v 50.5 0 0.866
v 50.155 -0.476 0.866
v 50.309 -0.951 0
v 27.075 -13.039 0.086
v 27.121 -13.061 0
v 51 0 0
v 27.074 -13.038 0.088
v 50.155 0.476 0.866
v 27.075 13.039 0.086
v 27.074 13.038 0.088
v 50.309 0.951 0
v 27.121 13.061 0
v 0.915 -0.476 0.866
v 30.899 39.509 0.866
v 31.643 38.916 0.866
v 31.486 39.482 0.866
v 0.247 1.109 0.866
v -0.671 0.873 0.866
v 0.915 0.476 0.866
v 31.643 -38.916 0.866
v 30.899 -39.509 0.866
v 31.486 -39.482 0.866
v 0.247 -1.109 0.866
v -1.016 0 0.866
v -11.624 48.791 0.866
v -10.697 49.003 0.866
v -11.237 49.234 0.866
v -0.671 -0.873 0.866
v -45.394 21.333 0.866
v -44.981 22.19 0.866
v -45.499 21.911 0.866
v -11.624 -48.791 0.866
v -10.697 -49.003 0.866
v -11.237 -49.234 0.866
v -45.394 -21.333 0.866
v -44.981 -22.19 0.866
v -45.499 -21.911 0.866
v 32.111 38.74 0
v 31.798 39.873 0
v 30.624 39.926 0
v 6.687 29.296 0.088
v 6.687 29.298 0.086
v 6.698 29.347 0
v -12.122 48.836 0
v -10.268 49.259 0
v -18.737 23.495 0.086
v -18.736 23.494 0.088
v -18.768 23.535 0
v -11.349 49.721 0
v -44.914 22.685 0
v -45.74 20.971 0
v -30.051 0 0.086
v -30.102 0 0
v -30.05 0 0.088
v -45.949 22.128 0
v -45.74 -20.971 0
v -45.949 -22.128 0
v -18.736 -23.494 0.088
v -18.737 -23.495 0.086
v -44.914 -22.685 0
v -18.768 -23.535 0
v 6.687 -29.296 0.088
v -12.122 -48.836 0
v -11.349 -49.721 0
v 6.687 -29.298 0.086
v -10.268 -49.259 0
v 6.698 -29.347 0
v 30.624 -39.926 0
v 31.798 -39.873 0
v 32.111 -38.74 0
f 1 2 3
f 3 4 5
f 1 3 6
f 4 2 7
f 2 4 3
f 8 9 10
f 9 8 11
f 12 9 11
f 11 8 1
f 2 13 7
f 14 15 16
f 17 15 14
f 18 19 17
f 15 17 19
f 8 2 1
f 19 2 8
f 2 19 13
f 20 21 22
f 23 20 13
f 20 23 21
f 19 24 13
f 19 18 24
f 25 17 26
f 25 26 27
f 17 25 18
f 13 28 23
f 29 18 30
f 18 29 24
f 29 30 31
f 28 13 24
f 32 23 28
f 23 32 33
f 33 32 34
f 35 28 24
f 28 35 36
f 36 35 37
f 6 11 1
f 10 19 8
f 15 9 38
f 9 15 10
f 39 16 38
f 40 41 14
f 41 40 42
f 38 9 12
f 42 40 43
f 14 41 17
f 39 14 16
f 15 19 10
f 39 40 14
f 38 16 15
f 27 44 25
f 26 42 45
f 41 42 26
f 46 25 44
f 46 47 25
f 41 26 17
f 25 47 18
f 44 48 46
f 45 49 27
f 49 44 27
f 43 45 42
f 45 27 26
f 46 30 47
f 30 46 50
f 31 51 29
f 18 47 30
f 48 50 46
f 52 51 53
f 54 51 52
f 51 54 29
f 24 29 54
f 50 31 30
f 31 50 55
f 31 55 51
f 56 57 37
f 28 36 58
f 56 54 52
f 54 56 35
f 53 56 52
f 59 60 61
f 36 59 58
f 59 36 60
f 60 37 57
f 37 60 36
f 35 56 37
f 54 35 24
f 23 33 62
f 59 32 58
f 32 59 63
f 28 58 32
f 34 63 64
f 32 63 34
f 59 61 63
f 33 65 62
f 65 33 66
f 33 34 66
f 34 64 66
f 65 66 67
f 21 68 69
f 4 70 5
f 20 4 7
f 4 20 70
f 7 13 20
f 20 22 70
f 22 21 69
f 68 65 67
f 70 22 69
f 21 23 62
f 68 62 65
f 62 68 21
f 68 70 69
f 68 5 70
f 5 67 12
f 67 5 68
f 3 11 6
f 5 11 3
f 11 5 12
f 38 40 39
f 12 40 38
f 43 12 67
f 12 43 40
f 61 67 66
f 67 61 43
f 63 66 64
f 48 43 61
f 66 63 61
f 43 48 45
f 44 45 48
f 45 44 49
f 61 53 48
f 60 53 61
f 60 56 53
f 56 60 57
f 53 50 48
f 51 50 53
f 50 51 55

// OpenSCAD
/*[ Star  variables ]*/
//  number of points
NumberOfPoints =7; // [3:100]

//  length of points
LengthOfPoints =20; // [1:100]

//  outside diameter of star
TotalDiameterOfStar =50; // [10:200]

//  outside point roundness / height
OutsidePointRoundnessHeight =1; // [.1:50]

//  middle point roudness / height
MiddlepointRoudness =.1; // [.1:100]

//  center point height
centerpointHeight =1; // [.1:100]

// Do you want the bottom cut flat?
flatBottom="flat"; // ["flat","round"]

if(flatBottom == "flat"){
    difference(){
        star3d(NumberOfPoints
            ,LengthOfPoints
            ,TotalDiameterOfStar
            ,OutsidePointRoundnessHeight
            ,MiddlepointRoudness
            ,centerpointHeight);
        translate([0,0,-50])cube([TotalDiameterOfStar*3,TotalDiameterOfStar*3,100],true);
}
}else{
    star3d(NumberOfPoints
    ,LengthOfPoints
    ,TotalDiameterOfStar
    ,OutsidePointRoundnessHeight
    ,MiddlepointRoudness
    ,centerpointHeight);
}

module star3d(points, pointLEngth,totaldiameter, pointroundness = 1,MiddlepointRoudness = .1,centerPointHeight = 1){
    innerpointPosition = (360/points)/2;
    for(i=[0:points]){
        outerpointPosistion = (i*360)/points;
       hull(){
    rotate([0,0,outerpointPosistion])
            translate([totaldiameter,0,0])
                sphere(pointroundness,true);
    rotate([0,0,outerpointPosistion+ innerpointPosition])
            translate([totaldiameter-pointLEngth,0,0])
                sphere(MiddlepointRoudness,true);
     rotate([0,0,outerpointPosistion- innerpointPosition])
            translate([totaldiameter-pointLEngth,0,0])
                sphere(MiddlepointRoudness,true);
           sphere(centerPointHeight,true);
        }
        
    }
}
